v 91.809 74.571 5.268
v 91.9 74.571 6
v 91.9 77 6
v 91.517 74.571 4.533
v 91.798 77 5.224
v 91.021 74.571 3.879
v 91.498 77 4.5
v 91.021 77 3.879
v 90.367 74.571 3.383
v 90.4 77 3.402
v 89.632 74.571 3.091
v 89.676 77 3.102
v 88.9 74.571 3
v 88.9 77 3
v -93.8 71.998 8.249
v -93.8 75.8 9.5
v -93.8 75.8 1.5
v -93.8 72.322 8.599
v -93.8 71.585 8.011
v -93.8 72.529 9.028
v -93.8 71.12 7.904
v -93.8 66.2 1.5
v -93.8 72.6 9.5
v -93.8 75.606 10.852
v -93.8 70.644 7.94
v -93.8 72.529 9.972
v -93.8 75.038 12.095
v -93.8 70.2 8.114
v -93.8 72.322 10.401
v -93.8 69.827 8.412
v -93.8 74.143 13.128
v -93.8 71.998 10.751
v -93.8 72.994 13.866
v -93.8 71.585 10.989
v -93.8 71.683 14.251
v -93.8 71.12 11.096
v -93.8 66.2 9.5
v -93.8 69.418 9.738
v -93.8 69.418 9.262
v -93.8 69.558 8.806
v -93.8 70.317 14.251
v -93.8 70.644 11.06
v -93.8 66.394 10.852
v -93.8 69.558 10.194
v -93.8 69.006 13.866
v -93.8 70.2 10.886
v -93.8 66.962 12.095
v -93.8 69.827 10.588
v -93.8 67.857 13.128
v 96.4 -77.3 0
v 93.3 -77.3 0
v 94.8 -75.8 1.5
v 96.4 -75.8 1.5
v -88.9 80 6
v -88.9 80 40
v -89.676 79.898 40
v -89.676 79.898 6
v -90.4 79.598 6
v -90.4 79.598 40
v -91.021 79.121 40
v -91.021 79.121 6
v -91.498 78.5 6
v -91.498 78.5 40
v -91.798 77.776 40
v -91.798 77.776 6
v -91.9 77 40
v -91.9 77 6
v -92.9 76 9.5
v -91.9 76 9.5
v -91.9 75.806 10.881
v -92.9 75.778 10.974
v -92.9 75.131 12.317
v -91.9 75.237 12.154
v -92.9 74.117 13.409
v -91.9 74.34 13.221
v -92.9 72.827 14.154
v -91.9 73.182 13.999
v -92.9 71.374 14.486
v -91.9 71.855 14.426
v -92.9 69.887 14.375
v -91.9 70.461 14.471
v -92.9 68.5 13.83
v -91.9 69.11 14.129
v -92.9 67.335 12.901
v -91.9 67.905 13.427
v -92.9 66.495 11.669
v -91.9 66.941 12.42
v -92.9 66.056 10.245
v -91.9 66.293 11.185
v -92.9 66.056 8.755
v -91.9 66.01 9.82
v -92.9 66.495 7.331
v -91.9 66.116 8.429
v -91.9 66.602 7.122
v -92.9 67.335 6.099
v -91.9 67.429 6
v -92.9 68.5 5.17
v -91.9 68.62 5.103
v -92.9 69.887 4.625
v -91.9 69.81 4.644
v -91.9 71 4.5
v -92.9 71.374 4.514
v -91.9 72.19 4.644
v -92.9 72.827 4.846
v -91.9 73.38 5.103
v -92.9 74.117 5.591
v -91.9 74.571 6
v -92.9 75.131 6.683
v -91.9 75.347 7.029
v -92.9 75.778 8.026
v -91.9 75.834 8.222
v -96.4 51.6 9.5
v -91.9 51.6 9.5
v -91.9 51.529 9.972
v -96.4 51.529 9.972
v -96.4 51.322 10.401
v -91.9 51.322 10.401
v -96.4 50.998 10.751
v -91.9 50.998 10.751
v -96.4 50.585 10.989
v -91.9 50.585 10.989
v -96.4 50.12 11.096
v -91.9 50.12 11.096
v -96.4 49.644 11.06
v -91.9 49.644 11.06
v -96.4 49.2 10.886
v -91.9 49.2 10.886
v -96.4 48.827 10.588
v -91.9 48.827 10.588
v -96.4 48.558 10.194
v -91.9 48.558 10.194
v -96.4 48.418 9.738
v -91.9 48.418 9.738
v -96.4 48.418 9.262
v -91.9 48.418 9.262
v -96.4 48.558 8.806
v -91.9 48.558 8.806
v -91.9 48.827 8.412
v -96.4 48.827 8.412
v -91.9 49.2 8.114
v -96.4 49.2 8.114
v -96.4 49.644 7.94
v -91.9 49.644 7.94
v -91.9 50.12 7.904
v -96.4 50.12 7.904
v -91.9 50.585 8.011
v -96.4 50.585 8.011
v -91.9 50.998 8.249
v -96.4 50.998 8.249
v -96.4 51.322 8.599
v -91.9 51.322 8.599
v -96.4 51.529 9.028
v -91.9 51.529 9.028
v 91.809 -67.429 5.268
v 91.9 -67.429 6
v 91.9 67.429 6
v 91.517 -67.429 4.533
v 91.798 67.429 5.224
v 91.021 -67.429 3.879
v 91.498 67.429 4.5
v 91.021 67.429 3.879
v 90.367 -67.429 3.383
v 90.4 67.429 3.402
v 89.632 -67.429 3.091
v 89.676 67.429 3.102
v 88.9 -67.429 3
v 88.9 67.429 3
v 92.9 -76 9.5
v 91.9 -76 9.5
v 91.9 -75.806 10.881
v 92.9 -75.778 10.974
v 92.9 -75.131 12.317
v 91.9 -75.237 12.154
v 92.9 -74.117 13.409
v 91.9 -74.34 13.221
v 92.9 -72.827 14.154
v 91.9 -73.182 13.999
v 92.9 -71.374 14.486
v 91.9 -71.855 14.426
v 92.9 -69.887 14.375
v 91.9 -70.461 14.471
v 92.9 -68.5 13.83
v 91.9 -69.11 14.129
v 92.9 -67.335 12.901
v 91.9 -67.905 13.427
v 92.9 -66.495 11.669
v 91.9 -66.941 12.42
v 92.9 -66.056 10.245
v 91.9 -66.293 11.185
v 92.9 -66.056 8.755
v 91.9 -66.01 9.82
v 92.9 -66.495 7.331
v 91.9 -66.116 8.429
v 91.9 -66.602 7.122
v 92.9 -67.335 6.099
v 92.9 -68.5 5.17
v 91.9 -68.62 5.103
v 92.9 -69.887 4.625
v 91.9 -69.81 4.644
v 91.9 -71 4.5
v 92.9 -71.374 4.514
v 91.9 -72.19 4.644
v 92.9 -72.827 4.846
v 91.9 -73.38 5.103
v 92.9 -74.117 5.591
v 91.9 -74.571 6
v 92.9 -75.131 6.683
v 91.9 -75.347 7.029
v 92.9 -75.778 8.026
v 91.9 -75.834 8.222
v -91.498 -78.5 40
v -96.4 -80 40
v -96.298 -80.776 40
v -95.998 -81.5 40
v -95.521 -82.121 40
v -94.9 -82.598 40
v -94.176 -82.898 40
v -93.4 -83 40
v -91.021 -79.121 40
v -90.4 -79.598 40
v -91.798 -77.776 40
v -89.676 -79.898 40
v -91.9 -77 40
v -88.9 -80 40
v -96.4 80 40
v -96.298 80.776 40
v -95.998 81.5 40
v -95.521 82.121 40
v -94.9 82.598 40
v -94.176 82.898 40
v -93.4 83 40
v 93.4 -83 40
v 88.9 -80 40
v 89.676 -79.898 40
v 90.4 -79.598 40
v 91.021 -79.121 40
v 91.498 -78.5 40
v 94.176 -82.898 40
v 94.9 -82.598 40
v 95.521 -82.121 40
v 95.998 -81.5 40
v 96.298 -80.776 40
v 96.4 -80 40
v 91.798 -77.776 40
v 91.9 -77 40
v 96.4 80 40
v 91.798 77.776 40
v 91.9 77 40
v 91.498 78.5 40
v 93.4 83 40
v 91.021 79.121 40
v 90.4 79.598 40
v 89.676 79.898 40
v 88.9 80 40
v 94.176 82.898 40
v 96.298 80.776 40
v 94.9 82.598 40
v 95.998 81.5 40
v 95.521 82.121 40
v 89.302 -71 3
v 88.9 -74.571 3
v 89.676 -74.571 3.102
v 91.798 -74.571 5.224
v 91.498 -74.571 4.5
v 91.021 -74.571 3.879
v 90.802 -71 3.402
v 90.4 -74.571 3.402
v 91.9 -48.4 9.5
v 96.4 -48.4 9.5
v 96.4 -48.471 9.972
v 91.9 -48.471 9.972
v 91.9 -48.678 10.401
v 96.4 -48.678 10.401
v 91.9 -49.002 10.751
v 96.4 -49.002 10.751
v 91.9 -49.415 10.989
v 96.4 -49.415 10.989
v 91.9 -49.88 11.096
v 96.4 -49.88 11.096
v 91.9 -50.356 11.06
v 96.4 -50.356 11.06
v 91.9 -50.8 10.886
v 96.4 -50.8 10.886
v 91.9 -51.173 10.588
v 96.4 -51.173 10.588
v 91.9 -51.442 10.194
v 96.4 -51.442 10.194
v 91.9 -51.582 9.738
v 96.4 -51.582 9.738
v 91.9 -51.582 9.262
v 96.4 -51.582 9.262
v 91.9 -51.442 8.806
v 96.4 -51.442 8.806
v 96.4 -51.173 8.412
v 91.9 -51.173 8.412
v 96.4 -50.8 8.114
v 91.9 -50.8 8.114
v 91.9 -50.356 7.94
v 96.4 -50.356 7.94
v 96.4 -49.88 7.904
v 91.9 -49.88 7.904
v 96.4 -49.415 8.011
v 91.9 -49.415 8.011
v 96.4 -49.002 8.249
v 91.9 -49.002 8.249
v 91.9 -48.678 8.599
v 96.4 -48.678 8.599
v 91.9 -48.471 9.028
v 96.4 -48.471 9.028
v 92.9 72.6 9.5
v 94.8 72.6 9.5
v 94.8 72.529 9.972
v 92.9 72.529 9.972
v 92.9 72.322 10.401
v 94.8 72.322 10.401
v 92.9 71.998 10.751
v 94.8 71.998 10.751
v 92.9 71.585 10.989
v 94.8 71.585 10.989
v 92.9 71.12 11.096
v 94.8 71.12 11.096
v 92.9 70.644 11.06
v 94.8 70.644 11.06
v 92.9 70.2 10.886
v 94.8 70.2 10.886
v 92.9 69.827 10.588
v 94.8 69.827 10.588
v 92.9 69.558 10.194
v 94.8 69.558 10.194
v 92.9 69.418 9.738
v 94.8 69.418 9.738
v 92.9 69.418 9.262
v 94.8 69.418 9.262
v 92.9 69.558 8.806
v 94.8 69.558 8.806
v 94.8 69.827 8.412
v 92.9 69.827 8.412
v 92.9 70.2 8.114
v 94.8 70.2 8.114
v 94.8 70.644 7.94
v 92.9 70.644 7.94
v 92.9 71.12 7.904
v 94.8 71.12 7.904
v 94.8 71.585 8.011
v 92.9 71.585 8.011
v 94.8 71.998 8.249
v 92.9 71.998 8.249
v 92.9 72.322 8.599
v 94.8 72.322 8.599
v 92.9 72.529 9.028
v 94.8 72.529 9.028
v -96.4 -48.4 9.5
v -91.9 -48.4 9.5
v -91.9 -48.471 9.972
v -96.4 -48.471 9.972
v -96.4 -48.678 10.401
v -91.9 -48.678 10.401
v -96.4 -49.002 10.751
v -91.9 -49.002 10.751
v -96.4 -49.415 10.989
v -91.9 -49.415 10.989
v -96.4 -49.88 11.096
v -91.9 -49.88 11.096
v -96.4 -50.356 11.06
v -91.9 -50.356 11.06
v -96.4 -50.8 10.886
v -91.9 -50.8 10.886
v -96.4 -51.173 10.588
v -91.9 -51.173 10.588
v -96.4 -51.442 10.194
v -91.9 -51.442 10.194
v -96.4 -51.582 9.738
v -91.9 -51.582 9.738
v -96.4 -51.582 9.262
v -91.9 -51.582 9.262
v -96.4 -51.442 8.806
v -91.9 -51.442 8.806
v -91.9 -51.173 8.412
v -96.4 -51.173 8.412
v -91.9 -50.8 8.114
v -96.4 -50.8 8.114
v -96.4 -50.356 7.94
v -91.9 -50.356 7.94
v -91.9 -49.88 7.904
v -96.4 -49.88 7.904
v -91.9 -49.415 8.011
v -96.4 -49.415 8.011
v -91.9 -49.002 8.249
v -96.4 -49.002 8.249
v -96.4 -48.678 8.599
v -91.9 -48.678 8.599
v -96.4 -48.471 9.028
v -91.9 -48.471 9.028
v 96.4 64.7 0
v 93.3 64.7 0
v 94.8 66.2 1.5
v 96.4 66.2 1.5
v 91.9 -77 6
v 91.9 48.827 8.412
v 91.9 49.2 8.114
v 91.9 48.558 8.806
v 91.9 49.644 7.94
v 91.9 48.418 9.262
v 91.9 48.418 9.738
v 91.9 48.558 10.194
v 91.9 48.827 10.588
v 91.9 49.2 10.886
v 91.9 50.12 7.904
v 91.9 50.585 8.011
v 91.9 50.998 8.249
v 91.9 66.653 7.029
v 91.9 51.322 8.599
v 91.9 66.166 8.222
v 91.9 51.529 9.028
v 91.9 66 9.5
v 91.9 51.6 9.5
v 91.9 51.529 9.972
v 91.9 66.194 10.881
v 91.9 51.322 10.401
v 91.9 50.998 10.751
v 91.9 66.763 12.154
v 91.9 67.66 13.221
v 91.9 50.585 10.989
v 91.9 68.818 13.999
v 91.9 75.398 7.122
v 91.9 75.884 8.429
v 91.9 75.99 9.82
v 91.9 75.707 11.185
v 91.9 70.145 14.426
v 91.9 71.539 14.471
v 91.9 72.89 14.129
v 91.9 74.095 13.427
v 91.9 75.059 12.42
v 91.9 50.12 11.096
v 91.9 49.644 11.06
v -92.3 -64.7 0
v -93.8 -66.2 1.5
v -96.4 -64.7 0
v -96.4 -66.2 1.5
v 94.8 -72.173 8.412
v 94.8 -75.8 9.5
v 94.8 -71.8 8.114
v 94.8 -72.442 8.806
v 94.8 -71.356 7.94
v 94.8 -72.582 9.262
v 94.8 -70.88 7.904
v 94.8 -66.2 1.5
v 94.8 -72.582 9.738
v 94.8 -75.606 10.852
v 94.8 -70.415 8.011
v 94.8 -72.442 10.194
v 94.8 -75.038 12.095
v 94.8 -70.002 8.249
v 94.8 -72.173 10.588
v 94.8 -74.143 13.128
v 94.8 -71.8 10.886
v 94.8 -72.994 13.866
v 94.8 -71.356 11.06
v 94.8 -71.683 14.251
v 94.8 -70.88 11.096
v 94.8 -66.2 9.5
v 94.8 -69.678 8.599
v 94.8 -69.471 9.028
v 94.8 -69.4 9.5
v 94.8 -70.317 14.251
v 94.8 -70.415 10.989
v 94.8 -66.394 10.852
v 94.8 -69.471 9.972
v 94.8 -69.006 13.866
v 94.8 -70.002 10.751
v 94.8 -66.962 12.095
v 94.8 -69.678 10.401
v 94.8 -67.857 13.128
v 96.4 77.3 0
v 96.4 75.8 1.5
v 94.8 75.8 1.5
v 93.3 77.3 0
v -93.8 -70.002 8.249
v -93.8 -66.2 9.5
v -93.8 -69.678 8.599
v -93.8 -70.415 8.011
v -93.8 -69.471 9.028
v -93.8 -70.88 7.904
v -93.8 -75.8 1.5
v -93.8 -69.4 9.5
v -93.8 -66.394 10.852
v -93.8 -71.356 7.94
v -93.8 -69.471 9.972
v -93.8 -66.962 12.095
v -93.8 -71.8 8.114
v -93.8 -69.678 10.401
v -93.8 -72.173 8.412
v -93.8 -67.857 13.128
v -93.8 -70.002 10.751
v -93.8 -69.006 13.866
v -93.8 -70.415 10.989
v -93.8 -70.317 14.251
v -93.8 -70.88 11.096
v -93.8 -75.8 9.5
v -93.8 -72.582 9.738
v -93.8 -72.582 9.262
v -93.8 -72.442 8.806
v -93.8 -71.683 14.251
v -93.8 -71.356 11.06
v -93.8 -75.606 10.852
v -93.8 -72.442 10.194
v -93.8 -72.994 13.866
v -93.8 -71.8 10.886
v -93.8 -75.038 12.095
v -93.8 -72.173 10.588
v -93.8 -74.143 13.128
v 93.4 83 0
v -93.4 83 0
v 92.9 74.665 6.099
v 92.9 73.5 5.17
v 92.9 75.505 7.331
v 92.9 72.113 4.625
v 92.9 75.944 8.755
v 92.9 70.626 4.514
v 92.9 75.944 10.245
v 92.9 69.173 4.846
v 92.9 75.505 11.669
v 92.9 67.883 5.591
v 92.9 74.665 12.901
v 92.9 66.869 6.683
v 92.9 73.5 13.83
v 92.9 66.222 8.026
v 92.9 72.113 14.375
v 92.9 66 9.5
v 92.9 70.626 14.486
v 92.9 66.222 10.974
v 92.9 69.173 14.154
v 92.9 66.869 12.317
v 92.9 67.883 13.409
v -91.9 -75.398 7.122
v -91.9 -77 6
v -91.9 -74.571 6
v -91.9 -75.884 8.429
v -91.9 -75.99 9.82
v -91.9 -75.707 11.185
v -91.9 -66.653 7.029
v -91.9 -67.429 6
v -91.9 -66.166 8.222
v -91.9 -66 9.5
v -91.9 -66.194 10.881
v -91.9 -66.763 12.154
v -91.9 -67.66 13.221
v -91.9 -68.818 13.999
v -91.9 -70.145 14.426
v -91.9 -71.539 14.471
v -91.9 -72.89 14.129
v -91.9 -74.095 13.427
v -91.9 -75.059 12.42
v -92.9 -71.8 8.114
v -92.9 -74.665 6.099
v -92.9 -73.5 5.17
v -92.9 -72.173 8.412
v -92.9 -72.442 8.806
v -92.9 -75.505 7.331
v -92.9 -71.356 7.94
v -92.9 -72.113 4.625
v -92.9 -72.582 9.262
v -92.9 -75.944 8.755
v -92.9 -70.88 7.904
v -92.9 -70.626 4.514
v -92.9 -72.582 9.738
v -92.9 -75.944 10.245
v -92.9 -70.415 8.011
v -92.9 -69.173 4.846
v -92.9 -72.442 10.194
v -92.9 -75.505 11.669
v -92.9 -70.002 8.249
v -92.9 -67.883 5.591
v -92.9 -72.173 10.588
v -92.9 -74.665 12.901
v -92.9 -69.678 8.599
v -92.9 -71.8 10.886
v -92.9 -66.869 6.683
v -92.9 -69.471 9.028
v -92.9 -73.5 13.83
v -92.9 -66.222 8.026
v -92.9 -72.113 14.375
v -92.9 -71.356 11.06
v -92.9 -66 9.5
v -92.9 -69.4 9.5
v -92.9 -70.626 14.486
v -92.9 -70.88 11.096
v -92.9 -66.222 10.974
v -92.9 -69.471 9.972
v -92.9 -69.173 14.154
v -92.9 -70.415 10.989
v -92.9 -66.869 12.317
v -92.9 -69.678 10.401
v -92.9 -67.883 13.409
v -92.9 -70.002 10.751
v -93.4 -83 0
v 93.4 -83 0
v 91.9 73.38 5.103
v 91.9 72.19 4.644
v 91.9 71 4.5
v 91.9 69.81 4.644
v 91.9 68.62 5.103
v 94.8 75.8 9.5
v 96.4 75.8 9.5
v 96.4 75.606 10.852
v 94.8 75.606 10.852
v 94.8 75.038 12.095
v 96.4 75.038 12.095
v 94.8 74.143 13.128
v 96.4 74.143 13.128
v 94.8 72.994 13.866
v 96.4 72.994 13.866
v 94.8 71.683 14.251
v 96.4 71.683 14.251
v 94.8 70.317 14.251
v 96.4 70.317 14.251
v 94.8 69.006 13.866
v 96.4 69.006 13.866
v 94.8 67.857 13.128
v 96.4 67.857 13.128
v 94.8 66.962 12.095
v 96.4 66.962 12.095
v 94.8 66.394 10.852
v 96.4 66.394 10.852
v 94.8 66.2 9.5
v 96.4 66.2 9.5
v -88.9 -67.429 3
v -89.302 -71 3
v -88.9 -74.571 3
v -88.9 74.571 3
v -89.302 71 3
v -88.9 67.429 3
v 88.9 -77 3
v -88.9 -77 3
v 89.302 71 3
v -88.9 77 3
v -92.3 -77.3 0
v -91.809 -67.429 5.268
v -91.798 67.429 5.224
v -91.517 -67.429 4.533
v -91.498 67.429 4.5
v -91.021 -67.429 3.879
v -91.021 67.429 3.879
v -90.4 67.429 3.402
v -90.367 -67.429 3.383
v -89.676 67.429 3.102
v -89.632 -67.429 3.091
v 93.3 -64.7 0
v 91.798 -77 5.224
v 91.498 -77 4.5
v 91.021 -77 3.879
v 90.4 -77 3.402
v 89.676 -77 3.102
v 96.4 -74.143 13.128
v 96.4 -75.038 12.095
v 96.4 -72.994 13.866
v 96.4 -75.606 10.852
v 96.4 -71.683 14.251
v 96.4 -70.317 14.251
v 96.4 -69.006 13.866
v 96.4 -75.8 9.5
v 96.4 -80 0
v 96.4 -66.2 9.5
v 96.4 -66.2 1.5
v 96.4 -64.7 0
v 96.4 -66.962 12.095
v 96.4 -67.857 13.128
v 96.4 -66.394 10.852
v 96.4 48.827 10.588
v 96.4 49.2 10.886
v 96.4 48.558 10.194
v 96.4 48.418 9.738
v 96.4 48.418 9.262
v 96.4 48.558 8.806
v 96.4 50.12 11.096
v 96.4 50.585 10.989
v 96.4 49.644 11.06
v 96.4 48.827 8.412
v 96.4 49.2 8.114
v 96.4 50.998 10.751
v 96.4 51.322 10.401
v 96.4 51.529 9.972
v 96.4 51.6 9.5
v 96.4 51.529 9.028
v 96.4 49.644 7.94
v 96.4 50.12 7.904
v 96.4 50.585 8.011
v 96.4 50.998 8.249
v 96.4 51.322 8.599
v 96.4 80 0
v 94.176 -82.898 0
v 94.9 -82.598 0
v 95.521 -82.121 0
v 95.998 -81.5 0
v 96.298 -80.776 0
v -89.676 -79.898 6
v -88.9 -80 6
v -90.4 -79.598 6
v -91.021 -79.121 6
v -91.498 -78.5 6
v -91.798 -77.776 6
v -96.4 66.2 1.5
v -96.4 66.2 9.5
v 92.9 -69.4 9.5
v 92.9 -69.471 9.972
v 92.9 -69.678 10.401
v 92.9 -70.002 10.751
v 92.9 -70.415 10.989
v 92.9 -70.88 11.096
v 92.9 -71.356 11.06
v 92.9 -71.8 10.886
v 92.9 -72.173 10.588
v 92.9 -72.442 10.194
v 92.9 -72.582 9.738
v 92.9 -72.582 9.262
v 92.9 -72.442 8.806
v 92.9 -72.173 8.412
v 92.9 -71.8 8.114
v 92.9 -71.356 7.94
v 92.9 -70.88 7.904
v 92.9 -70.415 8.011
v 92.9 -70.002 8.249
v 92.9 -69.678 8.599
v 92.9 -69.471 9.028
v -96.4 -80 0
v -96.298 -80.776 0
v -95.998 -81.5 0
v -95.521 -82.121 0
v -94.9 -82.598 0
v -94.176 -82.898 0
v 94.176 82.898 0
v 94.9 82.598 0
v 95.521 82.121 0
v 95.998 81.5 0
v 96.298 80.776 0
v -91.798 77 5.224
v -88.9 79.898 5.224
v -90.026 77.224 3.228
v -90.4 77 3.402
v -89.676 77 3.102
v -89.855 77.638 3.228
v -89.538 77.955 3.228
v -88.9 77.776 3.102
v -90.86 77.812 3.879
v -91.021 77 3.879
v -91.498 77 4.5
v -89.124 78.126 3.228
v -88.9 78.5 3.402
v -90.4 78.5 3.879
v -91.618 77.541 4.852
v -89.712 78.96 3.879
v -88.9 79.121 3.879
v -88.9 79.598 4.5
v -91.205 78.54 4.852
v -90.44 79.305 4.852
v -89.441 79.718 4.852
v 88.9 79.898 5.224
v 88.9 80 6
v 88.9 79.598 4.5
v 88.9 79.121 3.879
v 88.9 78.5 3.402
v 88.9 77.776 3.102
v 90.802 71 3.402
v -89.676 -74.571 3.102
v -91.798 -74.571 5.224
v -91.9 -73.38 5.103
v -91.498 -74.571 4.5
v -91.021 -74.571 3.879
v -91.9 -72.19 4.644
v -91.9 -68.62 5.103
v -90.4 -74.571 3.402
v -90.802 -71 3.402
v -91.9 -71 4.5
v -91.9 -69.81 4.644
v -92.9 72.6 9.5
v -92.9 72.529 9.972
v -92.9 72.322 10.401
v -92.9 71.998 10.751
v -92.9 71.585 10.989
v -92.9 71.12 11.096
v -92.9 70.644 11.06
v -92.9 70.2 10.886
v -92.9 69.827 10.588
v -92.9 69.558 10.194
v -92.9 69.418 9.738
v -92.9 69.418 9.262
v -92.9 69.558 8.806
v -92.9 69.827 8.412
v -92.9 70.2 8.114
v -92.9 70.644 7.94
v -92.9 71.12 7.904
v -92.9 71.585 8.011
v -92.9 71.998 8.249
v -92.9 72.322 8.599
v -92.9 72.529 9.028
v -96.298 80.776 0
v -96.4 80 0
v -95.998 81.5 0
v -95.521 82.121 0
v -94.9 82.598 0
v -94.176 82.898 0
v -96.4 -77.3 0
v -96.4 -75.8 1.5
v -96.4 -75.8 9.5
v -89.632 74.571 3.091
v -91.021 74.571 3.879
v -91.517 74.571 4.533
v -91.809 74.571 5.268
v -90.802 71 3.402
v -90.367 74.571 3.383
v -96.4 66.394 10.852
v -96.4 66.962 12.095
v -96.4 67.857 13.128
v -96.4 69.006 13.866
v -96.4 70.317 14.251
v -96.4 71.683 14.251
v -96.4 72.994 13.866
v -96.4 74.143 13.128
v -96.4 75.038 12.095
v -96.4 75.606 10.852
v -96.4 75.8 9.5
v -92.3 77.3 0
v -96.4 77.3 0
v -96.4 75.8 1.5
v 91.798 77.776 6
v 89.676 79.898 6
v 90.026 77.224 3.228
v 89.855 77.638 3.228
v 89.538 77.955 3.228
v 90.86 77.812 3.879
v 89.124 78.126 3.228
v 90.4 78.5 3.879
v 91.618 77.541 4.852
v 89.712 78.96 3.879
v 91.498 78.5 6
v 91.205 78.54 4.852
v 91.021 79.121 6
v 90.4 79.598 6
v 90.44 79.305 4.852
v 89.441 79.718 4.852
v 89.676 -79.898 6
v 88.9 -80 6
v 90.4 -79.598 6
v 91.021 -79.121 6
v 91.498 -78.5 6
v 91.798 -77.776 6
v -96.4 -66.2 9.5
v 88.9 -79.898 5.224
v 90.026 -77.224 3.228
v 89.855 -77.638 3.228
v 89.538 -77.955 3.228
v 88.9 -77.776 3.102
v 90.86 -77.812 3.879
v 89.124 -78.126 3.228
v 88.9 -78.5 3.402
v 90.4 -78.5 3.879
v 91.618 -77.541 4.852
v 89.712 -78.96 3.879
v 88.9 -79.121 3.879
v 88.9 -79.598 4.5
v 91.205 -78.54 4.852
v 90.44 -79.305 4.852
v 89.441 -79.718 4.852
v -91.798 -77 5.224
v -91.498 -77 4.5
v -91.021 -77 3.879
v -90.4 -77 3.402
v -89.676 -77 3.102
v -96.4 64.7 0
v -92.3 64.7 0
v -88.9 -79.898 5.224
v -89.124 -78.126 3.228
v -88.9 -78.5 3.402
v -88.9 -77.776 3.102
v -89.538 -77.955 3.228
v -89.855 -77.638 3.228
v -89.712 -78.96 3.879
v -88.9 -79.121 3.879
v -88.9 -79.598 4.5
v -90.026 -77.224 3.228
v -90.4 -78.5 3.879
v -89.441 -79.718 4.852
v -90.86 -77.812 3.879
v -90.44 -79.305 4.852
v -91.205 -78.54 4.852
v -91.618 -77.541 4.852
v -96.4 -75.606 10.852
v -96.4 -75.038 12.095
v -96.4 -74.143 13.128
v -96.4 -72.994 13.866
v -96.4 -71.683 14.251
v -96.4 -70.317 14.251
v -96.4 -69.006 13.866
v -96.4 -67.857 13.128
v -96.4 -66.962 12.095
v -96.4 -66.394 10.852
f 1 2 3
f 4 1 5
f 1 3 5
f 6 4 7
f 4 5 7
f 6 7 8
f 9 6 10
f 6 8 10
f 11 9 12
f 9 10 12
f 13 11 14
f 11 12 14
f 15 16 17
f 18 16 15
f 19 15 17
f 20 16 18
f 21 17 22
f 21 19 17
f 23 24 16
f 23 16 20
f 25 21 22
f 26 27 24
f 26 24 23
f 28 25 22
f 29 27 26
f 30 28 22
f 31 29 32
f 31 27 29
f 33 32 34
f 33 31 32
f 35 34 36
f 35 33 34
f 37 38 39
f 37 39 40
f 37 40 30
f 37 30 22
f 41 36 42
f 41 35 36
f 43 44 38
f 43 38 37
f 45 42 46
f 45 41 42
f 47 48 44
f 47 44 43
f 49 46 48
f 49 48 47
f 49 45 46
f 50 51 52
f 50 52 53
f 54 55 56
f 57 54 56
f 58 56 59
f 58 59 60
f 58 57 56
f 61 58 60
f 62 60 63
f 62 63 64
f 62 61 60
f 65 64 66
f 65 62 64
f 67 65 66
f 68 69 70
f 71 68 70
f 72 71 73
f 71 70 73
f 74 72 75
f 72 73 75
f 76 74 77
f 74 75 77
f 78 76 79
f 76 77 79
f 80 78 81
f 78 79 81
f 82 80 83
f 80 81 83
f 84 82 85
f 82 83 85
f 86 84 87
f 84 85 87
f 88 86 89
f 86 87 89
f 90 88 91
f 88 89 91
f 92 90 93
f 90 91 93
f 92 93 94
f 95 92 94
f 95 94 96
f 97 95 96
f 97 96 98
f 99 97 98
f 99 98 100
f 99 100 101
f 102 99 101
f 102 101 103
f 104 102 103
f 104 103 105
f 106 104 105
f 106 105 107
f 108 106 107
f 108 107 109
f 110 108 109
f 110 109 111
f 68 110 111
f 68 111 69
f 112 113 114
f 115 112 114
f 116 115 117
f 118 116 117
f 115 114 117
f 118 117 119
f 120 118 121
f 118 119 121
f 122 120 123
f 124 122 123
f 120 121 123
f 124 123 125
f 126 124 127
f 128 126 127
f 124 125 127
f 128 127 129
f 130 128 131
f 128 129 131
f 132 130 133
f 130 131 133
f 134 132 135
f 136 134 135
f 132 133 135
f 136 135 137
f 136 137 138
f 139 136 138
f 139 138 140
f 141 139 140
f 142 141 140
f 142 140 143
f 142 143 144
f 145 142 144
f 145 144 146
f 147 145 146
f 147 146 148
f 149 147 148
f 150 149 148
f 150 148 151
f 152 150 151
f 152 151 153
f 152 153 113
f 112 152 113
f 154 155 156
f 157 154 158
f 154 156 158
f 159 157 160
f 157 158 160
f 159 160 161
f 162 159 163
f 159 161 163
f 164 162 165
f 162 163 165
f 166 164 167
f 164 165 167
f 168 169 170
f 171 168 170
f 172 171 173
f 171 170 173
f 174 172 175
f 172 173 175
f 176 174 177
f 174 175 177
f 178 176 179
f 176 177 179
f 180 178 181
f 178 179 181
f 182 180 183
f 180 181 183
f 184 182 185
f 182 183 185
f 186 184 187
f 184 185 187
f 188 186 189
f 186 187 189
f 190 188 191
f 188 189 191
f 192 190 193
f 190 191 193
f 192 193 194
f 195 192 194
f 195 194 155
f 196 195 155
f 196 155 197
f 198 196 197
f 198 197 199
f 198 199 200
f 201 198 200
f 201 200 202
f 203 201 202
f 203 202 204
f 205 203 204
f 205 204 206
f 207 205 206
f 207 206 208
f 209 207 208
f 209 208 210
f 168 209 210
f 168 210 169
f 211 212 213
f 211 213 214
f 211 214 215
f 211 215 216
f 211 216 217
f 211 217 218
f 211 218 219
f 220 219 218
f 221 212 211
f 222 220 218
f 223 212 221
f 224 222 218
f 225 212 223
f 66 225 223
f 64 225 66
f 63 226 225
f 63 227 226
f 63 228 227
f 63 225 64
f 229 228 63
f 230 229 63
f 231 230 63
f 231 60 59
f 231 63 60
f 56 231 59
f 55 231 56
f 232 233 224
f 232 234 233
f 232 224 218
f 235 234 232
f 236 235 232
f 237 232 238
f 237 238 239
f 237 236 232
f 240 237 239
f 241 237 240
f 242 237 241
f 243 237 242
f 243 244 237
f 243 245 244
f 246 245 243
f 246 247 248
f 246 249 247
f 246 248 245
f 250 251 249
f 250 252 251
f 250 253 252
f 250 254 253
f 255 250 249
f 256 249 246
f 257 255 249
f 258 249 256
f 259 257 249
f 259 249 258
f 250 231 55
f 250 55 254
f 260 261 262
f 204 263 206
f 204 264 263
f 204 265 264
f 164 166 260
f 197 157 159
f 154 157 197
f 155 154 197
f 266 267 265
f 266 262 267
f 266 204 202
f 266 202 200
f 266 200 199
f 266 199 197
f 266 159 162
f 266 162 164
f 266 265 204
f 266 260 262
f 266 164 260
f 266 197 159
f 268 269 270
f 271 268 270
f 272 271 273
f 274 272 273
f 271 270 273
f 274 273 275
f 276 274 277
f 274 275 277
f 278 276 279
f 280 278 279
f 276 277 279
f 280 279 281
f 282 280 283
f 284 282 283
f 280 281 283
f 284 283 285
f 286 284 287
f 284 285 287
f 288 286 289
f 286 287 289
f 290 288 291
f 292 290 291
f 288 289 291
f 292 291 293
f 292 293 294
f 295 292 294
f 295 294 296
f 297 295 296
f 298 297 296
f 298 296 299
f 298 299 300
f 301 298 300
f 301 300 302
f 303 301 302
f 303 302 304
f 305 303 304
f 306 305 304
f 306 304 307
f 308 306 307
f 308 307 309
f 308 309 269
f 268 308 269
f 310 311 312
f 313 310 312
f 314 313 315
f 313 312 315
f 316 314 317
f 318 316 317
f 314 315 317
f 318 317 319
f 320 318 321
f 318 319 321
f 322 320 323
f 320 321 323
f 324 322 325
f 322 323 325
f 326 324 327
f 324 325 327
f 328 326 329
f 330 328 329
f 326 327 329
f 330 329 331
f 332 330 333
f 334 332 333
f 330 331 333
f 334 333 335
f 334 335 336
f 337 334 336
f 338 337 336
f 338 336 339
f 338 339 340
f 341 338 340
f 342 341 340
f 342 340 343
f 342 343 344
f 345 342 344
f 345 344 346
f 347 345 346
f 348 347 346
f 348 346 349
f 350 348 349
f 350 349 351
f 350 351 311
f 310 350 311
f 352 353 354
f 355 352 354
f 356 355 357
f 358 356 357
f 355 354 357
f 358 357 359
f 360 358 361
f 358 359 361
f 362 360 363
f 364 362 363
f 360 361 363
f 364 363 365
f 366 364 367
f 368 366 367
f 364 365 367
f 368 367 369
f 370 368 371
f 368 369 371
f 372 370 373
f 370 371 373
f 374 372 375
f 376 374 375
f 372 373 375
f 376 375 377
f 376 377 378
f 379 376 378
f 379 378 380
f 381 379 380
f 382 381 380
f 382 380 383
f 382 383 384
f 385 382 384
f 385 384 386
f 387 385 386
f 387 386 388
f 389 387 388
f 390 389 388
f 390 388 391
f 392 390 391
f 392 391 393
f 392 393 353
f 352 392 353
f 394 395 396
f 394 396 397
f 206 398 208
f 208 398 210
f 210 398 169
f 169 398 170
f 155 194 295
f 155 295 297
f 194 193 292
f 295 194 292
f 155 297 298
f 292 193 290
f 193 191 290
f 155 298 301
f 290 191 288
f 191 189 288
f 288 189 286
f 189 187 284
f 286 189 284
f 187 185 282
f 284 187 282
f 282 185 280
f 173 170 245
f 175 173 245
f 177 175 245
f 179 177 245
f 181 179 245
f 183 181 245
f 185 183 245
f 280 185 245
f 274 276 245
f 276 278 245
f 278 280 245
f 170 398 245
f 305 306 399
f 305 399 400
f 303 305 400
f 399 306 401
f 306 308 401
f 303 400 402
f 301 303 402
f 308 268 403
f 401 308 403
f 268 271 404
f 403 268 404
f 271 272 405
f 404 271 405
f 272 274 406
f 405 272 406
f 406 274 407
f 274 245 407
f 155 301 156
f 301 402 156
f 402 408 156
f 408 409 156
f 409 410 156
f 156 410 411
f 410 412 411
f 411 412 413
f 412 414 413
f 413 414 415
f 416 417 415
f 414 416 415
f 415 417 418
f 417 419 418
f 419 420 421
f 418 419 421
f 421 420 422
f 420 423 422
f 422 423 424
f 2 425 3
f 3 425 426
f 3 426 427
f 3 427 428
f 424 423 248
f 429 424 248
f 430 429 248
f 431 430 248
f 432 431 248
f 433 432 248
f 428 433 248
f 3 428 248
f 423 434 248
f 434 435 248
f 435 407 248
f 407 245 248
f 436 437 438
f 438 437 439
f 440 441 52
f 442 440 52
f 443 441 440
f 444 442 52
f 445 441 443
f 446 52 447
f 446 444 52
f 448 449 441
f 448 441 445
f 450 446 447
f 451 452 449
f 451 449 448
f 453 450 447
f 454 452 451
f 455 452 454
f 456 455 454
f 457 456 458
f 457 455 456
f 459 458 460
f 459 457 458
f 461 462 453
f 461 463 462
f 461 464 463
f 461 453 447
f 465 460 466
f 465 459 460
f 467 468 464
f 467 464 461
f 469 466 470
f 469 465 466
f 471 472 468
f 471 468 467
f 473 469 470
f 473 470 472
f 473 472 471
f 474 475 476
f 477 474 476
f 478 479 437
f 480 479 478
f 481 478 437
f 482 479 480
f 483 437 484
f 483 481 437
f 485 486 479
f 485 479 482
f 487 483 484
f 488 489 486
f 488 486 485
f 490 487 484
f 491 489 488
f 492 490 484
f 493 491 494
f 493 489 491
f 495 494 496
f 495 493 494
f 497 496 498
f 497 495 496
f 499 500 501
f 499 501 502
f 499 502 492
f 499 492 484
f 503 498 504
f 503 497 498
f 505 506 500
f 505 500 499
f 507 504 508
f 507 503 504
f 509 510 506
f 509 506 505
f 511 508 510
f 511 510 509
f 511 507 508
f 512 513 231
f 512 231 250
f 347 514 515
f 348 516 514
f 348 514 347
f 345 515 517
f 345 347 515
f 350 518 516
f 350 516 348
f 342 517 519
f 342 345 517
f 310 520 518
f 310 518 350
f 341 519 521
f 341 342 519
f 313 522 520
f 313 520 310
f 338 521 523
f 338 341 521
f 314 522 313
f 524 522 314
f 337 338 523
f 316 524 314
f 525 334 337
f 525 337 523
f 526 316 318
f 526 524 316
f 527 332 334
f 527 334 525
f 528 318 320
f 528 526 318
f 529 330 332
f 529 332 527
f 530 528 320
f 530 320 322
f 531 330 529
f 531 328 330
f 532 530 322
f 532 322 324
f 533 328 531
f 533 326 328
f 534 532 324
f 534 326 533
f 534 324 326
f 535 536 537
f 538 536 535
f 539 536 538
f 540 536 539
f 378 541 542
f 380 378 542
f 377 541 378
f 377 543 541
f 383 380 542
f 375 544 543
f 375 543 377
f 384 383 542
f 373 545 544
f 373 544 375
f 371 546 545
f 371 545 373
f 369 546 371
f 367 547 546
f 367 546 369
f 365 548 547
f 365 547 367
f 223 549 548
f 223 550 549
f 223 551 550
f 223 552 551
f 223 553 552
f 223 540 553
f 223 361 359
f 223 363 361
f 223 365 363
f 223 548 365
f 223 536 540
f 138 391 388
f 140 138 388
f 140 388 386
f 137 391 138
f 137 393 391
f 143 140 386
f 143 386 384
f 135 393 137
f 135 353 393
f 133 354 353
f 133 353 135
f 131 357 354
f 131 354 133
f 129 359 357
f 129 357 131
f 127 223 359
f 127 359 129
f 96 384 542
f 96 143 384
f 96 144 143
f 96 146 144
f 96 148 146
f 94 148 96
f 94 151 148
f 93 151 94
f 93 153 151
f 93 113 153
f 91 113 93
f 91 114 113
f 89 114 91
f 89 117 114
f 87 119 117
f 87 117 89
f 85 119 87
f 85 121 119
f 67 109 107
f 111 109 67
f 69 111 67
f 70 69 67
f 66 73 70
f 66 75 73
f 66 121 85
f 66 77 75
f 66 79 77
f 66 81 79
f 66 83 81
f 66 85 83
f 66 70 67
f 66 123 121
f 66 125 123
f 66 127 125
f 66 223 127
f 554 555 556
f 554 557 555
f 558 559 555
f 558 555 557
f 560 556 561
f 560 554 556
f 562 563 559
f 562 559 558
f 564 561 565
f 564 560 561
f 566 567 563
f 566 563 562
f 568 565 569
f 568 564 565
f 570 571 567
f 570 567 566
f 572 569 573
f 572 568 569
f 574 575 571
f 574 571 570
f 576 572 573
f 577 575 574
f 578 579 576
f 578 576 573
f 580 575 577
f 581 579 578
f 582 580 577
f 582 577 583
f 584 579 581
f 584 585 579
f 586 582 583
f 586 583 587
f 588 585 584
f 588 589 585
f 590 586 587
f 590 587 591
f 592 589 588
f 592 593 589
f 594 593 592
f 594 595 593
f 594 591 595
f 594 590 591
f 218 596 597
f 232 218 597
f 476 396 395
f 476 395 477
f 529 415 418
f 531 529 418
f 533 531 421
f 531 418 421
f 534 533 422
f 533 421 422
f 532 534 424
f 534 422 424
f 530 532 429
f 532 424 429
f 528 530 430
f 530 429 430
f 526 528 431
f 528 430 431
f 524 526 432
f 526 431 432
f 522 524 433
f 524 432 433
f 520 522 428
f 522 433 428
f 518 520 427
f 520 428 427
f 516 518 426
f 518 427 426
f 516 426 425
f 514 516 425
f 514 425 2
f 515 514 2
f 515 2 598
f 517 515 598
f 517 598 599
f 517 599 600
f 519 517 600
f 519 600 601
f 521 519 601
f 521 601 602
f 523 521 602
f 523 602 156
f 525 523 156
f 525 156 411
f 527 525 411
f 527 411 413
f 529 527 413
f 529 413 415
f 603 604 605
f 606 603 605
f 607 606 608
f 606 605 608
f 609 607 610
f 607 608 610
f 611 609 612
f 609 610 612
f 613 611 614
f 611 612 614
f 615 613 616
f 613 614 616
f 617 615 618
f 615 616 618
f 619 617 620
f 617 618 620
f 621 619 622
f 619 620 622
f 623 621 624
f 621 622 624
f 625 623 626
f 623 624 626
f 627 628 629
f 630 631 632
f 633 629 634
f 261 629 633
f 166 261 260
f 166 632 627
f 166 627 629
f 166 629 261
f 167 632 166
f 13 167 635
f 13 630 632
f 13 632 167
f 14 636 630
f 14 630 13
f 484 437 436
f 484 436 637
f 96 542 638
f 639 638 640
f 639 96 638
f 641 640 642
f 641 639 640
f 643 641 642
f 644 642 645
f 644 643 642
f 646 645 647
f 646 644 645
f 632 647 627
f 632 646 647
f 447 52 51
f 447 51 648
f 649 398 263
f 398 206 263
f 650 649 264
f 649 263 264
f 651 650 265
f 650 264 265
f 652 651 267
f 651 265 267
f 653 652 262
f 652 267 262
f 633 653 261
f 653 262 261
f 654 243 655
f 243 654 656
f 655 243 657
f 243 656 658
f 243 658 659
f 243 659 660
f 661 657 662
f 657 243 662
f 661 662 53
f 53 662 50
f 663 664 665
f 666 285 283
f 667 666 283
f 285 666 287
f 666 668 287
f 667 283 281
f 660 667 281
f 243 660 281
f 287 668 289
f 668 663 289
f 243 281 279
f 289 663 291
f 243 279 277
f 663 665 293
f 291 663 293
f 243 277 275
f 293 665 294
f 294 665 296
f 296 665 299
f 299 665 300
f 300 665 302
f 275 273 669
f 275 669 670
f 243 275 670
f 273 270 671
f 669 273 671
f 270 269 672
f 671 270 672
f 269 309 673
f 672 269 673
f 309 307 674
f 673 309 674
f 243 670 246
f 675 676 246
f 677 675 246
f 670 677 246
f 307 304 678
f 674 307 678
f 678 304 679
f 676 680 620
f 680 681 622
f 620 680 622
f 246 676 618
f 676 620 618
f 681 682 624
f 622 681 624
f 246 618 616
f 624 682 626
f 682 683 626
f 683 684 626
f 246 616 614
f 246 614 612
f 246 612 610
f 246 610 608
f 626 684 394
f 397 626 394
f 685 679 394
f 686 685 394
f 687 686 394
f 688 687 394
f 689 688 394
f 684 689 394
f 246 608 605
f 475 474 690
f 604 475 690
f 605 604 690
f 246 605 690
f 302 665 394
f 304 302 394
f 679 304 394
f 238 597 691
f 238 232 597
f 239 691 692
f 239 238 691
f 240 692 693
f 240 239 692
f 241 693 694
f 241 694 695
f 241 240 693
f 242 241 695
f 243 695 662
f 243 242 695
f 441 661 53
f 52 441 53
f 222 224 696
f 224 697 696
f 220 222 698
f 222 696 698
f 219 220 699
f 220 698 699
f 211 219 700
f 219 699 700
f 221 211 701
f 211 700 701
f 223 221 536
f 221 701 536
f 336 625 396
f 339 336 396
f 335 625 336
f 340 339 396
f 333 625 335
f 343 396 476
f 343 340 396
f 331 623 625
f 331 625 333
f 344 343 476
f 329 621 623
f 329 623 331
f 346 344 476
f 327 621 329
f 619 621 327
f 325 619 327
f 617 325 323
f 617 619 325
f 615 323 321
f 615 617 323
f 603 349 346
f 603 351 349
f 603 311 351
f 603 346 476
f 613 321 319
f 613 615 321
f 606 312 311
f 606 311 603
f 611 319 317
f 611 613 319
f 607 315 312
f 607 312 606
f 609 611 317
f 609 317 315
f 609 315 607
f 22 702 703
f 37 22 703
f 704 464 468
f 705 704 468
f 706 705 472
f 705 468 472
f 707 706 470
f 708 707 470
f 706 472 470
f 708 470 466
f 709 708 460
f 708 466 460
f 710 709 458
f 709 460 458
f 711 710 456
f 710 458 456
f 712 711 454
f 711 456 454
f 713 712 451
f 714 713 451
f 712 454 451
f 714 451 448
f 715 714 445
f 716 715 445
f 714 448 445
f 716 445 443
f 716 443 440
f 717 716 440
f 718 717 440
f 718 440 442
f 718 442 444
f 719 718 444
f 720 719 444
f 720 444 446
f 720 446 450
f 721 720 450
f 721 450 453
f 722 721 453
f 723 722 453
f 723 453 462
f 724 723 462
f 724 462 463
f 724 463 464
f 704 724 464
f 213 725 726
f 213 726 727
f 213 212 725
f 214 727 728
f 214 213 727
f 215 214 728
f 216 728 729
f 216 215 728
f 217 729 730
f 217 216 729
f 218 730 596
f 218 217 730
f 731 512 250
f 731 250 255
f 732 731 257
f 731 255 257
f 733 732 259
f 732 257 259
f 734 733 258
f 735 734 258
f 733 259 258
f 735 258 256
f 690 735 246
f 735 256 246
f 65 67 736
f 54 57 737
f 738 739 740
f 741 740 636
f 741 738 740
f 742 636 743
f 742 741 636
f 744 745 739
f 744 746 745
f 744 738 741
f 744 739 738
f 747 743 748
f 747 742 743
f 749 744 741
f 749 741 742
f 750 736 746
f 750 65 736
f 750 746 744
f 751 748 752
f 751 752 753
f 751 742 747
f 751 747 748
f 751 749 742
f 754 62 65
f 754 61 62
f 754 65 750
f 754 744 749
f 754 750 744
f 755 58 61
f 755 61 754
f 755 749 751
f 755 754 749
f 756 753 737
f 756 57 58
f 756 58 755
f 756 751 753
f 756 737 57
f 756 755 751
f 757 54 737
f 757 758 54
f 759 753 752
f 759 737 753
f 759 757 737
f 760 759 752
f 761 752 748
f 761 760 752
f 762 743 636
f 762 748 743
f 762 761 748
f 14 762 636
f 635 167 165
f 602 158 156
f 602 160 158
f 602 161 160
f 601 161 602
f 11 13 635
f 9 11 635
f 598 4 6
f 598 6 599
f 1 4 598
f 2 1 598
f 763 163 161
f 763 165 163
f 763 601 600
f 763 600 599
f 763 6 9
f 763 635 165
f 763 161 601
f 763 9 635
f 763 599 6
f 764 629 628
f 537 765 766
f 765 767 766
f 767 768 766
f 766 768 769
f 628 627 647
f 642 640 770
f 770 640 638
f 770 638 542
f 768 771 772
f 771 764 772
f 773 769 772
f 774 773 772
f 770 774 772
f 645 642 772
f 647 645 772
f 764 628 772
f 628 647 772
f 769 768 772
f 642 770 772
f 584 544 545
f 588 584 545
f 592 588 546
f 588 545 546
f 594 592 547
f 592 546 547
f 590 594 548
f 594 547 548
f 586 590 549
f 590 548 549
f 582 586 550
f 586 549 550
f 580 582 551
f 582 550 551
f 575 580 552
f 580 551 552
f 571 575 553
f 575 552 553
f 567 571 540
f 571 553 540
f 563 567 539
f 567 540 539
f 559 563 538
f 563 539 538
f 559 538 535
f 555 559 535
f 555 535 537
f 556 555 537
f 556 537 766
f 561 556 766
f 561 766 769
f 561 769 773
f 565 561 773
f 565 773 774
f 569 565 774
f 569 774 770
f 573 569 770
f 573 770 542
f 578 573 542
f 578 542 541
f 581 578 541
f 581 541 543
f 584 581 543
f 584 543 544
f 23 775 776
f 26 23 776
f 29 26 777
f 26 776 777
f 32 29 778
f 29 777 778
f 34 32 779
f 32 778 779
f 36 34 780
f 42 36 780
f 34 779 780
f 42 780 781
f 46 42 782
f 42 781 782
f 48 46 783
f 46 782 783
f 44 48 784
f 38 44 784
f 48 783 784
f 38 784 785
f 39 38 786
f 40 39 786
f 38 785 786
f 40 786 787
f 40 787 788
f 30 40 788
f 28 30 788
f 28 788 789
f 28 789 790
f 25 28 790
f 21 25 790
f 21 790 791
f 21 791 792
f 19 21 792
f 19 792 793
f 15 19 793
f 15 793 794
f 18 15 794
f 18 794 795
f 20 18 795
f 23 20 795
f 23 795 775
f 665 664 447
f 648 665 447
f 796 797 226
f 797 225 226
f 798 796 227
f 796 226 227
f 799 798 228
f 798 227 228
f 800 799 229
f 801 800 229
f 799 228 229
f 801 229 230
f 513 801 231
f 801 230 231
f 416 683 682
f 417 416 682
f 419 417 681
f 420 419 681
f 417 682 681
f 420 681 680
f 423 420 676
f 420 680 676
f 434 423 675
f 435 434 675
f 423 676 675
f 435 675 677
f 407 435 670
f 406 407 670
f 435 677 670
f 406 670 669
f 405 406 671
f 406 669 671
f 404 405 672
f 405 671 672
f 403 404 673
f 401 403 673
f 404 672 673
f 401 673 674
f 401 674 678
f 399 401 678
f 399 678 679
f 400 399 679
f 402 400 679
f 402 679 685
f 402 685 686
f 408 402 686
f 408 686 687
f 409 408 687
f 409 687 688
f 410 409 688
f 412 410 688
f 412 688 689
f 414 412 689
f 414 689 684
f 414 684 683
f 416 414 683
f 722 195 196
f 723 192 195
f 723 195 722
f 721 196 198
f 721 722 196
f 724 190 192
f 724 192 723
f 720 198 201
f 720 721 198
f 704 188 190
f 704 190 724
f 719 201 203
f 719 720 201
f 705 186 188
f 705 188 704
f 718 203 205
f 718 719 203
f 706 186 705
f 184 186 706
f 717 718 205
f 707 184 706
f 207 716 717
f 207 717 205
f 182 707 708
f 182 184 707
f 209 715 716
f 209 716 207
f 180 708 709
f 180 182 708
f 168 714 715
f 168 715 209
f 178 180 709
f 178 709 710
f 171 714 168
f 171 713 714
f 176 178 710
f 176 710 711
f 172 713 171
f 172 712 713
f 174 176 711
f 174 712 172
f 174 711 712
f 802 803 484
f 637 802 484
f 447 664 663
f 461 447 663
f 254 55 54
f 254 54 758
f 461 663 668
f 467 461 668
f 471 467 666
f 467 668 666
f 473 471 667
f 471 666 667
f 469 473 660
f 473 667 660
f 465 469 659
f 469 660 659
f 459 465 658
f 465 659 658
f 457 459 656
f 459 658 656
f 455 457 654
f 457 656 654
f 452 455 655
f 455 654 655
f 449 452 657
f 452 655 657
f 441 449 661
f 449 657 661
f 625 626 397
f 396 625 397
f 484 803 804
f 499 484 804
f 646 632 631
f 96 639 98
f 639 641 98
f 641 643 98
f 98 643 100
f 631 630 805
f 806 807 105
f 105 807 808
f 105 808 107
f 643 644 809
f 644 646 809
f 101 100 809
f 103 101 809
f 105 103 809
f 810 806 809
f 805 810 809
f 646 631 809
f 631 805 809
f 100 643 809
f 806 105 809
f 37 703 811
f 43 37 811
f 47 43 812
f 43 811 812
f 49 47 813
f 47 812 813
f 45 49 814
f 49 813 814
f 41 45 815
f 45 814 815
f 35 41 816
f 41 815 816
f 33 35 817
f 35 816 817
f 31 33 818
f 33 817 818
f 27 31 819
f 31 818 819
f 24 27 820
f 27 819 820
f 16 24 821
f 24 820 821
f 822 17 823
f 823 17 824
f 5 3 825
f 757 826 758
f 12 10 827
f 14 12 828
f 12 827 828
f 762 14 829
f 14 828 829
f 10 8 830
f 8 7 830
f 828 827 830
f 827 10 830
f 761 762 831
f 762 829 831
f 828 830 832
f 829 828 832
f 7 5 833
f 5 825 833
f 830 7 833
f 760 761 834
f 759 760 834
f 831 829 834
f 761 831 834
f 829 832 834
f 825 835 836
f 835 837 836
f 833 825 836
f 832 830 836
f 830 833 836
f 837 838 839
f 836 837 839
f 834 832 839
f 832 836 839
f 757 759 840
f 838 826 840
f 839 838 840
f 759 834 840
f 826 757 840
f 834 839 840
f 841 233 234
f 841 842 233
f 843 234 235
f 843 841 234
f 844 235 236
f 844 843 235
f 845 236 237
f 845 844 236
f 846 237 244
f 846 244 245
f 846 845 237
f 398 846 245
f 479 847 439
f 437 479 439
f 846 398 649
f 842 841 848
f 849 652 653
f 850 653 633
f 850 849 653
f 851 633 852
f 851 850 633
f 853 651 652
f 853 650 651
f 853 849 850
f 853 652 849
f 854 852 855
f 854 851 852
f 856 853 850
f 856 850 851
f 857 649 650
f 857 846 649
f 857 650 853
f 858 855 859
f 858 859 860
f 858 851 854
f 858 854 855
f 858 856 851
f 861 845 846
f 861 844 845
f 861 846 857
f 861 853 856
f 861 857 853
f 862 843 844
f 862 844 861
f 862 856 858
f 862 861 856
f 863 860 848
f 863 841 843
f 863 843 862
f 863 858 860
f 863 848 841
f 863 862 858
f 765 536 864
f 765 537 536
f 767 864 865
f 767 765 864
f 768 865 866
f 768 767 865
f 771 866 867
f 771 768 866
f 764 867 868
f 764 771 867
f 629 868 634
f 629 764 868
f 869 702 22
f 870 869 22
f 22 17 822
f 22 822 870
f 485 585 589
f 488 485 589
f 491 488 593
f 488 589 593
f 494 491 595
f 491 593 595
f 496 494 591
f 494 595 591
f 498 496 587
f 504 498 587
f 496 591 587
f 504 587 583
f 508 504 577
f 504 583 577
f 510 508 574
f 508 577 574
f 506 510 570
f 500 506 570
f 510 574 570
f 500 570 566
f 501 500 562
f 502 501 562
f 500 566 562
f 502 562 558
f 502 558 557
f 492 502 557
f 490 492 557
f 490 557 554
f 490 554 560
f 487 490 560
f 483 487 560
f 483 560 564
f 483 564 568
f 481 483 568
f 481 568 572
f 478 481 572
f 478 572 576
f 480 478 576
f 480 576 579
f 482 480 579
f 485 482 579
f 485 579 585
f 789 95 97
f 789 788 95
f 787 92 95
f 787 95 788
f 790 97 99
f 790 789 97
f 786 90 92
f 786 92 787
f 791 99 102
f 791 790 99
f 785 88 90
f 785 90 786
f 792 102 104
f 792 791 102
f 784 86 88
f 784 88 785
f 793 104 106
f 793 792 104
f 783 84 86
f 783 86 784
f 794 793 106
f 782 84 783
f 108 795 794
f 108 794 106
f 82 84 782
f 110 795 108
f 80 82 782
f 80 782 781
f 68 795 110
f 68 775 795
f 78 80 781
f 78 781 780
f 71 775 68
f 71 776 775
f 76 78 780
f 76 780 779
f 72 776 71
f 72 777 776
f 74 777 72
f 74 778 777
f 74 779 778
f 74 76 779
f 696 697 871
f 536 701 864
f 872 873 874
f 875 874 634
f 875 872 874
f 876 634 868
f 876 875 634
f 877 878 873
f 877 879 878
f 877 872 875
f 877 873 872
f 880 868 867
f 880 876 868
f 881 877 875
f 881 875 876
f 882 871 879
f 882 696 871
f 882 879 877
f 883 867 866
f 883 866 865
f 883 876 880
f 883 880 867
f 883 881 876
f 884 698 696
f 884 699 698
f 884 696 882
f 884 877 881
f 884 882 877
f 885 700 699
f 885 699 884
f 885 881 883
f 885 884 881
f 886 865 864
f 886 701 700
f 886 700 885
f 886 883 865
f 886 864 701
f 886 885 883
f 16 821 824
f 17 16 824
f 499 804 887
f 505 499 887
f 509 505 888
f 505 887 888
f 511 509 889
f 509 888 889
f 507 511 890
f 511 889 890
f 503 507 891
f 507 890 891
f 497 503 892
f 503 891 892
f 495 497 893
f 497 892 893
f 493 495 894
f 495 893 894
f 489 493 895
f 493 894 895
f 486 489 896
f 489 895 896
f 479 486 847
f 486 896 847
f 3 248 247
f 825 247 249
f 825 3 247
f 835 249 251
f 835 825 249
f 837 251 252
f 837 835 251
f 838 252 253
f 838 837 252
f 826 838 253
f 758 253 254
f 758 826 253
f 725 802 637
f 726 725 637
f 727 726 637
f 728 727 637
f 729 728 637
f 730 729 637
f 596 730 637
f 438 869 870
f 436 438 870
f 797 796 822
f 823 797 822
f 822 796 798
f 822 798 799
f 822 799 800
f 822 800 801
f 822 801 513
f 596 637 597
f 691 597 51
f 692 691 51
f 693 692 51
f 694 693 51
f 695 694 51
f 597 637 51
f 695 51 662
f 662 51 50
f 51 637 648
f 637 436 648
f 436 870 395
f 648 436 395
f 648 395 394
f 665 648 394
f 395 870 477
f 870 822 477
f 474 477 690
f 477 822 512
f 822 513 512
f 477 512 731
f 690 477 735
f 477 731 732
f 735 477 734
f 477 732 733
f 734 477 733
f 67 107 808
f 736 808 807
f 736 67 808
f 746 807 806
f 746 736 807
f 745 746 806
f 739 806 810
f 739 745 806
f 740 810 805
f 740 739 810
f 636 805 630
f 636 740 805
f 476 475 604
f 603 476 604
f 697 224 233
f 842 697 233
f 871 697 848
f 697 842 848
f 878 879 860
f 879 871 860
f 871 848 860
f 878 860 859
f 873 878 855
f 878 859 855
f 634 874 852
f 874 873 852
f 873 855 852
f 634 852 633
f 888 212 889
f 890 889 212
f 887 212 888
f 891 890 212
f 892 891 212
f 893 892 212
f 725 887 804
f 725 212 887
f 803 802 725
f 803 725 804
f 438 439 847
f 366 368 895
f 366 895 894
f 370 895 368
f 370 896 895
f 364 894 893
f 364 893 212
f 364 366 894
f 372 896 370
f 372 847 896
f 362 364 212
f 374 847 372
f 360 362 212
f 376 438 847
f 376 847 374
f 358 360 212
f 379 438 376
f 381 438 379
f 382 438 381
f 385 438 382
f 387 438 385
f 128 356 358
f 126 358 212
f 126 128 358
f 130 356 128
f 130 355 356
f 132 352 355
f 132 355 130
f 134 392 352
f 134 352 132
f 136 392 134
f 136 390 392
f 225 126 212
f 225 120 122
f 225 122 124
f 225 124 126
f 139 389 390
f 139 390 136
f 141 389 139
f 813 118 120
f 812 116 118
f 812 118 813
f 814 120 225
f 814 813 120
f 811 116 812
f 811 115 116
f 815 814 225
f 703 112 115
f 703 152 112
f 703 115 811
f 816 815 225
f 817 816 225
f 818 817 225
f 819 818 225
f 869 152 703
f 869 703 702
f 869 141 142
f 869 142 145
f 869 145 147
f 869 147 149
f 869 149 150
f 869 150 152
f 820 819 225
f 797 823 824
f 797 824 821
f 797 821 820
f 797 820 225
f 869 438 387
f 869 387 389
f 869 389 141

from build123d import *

# Parameters (mm, degrees)
SKETCH_W        = 192.8
SKETCH_H        = 166
PAD_DEPTH       = 40
SKETCH001_W     = 183.8
SKETCH001_H     = 160
POCKET_DEPTH    = 37
SKETCH002_R     = 1.6
POCKET001_DEPTH = 192.801
POCKET002_DEPTH = 2.6
SKETCH004_R     = 5
POCKET003_DEPTH = 1
SKETCH005_R     = 5
POCKET004_DEPTH = 1
POCKET005_DEPTH = 1.6
FILLET_R        = 3
CHAMFER_SIZE    = 1.5


with BuildPart() as part:
    # Sketch → Pad (new body)
    with BuildSketch(Plane.XY):
        Rectangle(SKETCH_W, SKETCH_H)
    extrude(amount=PAD_DEPTH)

    # Sketch001 (on Face6 of Pad) → Pocket (cut)
    with BuildSketch(Plane.XY.offset(40)):
        Rectangle(SKETCH001_W, SKETCH001_H)
    extrude(amount=-POCKET_DEPTH, mode=Mode.SUBTRACT)

    # Sketch002 (on Face3 of Pocket) → Pocket001 (cut, through all)
    with BuildSketch(Plane.YZ.offset(96.4)):
        with Locations((-71, 9.5)):
            Circle(SKETCH002_R)
        with Locations((-50, 9.5)):
            Circle(SKETCH002_R)
        with Locations((50, 9.5)):
            Circle(SKETCH002_R)
        with Locations((71, 9.5)):
            Circle(SKETCH002_R)
    extrude(amount=-POCKET001_DEPTH, mode=Mode.SUBTRACT)

    # Sketch003 (on Face2 of Pocket001) → Pocket002 (cut)
    with BuildSketch(Plane(origin=(-96.4, 0, 0), x_dir=(0, -1, 0), z_dir=(-1, 0, 0))):
        with BuildLine():
            ThreePointArc((-66.2, 9.5), (-71, 14.3), (-75.8, 9.5))
            Line((-75.8, 9.5), (-75.8, -4.8))
            ThreePointArc((-75.8, -4.8), (-71, -9.6), (-66.2, -4.8))
            Line((-66.2, -4.8), (-66.2, 9.5))
        make_face()
        with BuildLine():
            ThreePointArc((75.8, 9.5), (71, 14.3), (66.2, 9.5))
            Line((66.2, 9.5), (66.2, -4.8))
            ThreePointArc((66.2, -4.8), (71, -9.6), (75.8, -4.8))
            Line((75.8, -4.8), (75.8, 9.5))
        make_face()
    extrude(amount=-POCKET002_DEPTH, mode=Mode.SUBTRACT)

    # Sketch004 (on Face21 of Pocket002) → Pocket003 (cut)
    with BuildSketch(Plane.YZ.offset(-91.9)):
        with Locations((-71, 9.5)):
            Circle(SKETCH004_R)
        with Locations((71, 9.5)):
            Circle(SKETCH004_R)
    extrude(amount=-POCKET003_DEPTH, mode=Mode.SUBTRACT)

    # Sketch005 (on Face23 of Pocket003) → Pocket004 (cut)
    with BuildSketch(Plane(origin=(91.9, 0, 0), x_dir=(0, -1, 0), z_dir=(-1, 0, 0))):
        with Locations((-71, 9.5)):
            Circle(SKETCH005_R)
        with Locations((71, 9.5)):
            Circle(SKETCH005_R)
    extrude(amount=-POCKET004_DEPTH, mode=Mode.SUBTRACT)

    # Sketch006 (on Face3 of Pocket004) → Pocket005 (cut)
    with BuildSketch(Plane.YZ.offset(96.4)):
        with BuildLine():
            ThreePointArc((-66.2, 9.5), (-71, 14.3), (-75.8, 9.5))
            Line((-75.8, 9.5), (-75.8, -4.8))
            ThreePointArc((-75.8, -4.8), (-71, -9.6), (-66.2, -4.8))
            Line((-66.2, -4.8), (-66.2, 9.5))
        make_face()
        with BuildLine():
            ThreePointArc((75.8, 9.5), (71, 14.3), (66.2, 9.5))
            Line((66.2, 9.5), (66.2, -4.8))
            ThreePointArc((66.2, -4.8), (71, -9.6), (75.8, -4.8))
            Line((75.8, -4.8), (75.8, 9.5))
        make_face()
    extrude(amount=-POCKET005_DEPTH, mode=Mode.SUBTRACT)

    # Fillet
    fillet_edges = [part.edges().sort_by_distance(p)[0] for p in [
        (91.9, 80, 21.5),
        (-91.9, 80, 21.5),
        (-91.9, -80, 21.5),
        (91.9, -80, 21.5),
        (91.9, 0, 3),
        (0, -80, 3),
        (-91.9, 0, 3),
        (0, 80, 3),
        (-96.4, 83, 20),
        (-96.4, -83, 20),
        (96.4, -83, 20),
        (96.4, 83, 20),
    ]]
    fillet(fillet_edges, radius=FILLET_R)

    # Chamfer
    chamfer_edges = [part.edges().sort_by_distance(p)[0] for p in [
        (-93.8, -71, 0),
        (-95.1, -66.2, 0),
        (-95.1, -75.8, 0),
        (-95.1, 75.8, 0),
        (-93.8, 71, 0),
        (-95.1, 66.2, 0),
        (94.8, -71, 0),
        (95.6, -66.2, 0),
        (95.6, -75.8, 0),
        (94.8, 71, 0),
        (95.6, 66.2, 0),
        (95.6, 75.8, 0),
    ]]
    chamfer(chamfer_edges, length=CHAMFER_SIZE)


solid = part.part
